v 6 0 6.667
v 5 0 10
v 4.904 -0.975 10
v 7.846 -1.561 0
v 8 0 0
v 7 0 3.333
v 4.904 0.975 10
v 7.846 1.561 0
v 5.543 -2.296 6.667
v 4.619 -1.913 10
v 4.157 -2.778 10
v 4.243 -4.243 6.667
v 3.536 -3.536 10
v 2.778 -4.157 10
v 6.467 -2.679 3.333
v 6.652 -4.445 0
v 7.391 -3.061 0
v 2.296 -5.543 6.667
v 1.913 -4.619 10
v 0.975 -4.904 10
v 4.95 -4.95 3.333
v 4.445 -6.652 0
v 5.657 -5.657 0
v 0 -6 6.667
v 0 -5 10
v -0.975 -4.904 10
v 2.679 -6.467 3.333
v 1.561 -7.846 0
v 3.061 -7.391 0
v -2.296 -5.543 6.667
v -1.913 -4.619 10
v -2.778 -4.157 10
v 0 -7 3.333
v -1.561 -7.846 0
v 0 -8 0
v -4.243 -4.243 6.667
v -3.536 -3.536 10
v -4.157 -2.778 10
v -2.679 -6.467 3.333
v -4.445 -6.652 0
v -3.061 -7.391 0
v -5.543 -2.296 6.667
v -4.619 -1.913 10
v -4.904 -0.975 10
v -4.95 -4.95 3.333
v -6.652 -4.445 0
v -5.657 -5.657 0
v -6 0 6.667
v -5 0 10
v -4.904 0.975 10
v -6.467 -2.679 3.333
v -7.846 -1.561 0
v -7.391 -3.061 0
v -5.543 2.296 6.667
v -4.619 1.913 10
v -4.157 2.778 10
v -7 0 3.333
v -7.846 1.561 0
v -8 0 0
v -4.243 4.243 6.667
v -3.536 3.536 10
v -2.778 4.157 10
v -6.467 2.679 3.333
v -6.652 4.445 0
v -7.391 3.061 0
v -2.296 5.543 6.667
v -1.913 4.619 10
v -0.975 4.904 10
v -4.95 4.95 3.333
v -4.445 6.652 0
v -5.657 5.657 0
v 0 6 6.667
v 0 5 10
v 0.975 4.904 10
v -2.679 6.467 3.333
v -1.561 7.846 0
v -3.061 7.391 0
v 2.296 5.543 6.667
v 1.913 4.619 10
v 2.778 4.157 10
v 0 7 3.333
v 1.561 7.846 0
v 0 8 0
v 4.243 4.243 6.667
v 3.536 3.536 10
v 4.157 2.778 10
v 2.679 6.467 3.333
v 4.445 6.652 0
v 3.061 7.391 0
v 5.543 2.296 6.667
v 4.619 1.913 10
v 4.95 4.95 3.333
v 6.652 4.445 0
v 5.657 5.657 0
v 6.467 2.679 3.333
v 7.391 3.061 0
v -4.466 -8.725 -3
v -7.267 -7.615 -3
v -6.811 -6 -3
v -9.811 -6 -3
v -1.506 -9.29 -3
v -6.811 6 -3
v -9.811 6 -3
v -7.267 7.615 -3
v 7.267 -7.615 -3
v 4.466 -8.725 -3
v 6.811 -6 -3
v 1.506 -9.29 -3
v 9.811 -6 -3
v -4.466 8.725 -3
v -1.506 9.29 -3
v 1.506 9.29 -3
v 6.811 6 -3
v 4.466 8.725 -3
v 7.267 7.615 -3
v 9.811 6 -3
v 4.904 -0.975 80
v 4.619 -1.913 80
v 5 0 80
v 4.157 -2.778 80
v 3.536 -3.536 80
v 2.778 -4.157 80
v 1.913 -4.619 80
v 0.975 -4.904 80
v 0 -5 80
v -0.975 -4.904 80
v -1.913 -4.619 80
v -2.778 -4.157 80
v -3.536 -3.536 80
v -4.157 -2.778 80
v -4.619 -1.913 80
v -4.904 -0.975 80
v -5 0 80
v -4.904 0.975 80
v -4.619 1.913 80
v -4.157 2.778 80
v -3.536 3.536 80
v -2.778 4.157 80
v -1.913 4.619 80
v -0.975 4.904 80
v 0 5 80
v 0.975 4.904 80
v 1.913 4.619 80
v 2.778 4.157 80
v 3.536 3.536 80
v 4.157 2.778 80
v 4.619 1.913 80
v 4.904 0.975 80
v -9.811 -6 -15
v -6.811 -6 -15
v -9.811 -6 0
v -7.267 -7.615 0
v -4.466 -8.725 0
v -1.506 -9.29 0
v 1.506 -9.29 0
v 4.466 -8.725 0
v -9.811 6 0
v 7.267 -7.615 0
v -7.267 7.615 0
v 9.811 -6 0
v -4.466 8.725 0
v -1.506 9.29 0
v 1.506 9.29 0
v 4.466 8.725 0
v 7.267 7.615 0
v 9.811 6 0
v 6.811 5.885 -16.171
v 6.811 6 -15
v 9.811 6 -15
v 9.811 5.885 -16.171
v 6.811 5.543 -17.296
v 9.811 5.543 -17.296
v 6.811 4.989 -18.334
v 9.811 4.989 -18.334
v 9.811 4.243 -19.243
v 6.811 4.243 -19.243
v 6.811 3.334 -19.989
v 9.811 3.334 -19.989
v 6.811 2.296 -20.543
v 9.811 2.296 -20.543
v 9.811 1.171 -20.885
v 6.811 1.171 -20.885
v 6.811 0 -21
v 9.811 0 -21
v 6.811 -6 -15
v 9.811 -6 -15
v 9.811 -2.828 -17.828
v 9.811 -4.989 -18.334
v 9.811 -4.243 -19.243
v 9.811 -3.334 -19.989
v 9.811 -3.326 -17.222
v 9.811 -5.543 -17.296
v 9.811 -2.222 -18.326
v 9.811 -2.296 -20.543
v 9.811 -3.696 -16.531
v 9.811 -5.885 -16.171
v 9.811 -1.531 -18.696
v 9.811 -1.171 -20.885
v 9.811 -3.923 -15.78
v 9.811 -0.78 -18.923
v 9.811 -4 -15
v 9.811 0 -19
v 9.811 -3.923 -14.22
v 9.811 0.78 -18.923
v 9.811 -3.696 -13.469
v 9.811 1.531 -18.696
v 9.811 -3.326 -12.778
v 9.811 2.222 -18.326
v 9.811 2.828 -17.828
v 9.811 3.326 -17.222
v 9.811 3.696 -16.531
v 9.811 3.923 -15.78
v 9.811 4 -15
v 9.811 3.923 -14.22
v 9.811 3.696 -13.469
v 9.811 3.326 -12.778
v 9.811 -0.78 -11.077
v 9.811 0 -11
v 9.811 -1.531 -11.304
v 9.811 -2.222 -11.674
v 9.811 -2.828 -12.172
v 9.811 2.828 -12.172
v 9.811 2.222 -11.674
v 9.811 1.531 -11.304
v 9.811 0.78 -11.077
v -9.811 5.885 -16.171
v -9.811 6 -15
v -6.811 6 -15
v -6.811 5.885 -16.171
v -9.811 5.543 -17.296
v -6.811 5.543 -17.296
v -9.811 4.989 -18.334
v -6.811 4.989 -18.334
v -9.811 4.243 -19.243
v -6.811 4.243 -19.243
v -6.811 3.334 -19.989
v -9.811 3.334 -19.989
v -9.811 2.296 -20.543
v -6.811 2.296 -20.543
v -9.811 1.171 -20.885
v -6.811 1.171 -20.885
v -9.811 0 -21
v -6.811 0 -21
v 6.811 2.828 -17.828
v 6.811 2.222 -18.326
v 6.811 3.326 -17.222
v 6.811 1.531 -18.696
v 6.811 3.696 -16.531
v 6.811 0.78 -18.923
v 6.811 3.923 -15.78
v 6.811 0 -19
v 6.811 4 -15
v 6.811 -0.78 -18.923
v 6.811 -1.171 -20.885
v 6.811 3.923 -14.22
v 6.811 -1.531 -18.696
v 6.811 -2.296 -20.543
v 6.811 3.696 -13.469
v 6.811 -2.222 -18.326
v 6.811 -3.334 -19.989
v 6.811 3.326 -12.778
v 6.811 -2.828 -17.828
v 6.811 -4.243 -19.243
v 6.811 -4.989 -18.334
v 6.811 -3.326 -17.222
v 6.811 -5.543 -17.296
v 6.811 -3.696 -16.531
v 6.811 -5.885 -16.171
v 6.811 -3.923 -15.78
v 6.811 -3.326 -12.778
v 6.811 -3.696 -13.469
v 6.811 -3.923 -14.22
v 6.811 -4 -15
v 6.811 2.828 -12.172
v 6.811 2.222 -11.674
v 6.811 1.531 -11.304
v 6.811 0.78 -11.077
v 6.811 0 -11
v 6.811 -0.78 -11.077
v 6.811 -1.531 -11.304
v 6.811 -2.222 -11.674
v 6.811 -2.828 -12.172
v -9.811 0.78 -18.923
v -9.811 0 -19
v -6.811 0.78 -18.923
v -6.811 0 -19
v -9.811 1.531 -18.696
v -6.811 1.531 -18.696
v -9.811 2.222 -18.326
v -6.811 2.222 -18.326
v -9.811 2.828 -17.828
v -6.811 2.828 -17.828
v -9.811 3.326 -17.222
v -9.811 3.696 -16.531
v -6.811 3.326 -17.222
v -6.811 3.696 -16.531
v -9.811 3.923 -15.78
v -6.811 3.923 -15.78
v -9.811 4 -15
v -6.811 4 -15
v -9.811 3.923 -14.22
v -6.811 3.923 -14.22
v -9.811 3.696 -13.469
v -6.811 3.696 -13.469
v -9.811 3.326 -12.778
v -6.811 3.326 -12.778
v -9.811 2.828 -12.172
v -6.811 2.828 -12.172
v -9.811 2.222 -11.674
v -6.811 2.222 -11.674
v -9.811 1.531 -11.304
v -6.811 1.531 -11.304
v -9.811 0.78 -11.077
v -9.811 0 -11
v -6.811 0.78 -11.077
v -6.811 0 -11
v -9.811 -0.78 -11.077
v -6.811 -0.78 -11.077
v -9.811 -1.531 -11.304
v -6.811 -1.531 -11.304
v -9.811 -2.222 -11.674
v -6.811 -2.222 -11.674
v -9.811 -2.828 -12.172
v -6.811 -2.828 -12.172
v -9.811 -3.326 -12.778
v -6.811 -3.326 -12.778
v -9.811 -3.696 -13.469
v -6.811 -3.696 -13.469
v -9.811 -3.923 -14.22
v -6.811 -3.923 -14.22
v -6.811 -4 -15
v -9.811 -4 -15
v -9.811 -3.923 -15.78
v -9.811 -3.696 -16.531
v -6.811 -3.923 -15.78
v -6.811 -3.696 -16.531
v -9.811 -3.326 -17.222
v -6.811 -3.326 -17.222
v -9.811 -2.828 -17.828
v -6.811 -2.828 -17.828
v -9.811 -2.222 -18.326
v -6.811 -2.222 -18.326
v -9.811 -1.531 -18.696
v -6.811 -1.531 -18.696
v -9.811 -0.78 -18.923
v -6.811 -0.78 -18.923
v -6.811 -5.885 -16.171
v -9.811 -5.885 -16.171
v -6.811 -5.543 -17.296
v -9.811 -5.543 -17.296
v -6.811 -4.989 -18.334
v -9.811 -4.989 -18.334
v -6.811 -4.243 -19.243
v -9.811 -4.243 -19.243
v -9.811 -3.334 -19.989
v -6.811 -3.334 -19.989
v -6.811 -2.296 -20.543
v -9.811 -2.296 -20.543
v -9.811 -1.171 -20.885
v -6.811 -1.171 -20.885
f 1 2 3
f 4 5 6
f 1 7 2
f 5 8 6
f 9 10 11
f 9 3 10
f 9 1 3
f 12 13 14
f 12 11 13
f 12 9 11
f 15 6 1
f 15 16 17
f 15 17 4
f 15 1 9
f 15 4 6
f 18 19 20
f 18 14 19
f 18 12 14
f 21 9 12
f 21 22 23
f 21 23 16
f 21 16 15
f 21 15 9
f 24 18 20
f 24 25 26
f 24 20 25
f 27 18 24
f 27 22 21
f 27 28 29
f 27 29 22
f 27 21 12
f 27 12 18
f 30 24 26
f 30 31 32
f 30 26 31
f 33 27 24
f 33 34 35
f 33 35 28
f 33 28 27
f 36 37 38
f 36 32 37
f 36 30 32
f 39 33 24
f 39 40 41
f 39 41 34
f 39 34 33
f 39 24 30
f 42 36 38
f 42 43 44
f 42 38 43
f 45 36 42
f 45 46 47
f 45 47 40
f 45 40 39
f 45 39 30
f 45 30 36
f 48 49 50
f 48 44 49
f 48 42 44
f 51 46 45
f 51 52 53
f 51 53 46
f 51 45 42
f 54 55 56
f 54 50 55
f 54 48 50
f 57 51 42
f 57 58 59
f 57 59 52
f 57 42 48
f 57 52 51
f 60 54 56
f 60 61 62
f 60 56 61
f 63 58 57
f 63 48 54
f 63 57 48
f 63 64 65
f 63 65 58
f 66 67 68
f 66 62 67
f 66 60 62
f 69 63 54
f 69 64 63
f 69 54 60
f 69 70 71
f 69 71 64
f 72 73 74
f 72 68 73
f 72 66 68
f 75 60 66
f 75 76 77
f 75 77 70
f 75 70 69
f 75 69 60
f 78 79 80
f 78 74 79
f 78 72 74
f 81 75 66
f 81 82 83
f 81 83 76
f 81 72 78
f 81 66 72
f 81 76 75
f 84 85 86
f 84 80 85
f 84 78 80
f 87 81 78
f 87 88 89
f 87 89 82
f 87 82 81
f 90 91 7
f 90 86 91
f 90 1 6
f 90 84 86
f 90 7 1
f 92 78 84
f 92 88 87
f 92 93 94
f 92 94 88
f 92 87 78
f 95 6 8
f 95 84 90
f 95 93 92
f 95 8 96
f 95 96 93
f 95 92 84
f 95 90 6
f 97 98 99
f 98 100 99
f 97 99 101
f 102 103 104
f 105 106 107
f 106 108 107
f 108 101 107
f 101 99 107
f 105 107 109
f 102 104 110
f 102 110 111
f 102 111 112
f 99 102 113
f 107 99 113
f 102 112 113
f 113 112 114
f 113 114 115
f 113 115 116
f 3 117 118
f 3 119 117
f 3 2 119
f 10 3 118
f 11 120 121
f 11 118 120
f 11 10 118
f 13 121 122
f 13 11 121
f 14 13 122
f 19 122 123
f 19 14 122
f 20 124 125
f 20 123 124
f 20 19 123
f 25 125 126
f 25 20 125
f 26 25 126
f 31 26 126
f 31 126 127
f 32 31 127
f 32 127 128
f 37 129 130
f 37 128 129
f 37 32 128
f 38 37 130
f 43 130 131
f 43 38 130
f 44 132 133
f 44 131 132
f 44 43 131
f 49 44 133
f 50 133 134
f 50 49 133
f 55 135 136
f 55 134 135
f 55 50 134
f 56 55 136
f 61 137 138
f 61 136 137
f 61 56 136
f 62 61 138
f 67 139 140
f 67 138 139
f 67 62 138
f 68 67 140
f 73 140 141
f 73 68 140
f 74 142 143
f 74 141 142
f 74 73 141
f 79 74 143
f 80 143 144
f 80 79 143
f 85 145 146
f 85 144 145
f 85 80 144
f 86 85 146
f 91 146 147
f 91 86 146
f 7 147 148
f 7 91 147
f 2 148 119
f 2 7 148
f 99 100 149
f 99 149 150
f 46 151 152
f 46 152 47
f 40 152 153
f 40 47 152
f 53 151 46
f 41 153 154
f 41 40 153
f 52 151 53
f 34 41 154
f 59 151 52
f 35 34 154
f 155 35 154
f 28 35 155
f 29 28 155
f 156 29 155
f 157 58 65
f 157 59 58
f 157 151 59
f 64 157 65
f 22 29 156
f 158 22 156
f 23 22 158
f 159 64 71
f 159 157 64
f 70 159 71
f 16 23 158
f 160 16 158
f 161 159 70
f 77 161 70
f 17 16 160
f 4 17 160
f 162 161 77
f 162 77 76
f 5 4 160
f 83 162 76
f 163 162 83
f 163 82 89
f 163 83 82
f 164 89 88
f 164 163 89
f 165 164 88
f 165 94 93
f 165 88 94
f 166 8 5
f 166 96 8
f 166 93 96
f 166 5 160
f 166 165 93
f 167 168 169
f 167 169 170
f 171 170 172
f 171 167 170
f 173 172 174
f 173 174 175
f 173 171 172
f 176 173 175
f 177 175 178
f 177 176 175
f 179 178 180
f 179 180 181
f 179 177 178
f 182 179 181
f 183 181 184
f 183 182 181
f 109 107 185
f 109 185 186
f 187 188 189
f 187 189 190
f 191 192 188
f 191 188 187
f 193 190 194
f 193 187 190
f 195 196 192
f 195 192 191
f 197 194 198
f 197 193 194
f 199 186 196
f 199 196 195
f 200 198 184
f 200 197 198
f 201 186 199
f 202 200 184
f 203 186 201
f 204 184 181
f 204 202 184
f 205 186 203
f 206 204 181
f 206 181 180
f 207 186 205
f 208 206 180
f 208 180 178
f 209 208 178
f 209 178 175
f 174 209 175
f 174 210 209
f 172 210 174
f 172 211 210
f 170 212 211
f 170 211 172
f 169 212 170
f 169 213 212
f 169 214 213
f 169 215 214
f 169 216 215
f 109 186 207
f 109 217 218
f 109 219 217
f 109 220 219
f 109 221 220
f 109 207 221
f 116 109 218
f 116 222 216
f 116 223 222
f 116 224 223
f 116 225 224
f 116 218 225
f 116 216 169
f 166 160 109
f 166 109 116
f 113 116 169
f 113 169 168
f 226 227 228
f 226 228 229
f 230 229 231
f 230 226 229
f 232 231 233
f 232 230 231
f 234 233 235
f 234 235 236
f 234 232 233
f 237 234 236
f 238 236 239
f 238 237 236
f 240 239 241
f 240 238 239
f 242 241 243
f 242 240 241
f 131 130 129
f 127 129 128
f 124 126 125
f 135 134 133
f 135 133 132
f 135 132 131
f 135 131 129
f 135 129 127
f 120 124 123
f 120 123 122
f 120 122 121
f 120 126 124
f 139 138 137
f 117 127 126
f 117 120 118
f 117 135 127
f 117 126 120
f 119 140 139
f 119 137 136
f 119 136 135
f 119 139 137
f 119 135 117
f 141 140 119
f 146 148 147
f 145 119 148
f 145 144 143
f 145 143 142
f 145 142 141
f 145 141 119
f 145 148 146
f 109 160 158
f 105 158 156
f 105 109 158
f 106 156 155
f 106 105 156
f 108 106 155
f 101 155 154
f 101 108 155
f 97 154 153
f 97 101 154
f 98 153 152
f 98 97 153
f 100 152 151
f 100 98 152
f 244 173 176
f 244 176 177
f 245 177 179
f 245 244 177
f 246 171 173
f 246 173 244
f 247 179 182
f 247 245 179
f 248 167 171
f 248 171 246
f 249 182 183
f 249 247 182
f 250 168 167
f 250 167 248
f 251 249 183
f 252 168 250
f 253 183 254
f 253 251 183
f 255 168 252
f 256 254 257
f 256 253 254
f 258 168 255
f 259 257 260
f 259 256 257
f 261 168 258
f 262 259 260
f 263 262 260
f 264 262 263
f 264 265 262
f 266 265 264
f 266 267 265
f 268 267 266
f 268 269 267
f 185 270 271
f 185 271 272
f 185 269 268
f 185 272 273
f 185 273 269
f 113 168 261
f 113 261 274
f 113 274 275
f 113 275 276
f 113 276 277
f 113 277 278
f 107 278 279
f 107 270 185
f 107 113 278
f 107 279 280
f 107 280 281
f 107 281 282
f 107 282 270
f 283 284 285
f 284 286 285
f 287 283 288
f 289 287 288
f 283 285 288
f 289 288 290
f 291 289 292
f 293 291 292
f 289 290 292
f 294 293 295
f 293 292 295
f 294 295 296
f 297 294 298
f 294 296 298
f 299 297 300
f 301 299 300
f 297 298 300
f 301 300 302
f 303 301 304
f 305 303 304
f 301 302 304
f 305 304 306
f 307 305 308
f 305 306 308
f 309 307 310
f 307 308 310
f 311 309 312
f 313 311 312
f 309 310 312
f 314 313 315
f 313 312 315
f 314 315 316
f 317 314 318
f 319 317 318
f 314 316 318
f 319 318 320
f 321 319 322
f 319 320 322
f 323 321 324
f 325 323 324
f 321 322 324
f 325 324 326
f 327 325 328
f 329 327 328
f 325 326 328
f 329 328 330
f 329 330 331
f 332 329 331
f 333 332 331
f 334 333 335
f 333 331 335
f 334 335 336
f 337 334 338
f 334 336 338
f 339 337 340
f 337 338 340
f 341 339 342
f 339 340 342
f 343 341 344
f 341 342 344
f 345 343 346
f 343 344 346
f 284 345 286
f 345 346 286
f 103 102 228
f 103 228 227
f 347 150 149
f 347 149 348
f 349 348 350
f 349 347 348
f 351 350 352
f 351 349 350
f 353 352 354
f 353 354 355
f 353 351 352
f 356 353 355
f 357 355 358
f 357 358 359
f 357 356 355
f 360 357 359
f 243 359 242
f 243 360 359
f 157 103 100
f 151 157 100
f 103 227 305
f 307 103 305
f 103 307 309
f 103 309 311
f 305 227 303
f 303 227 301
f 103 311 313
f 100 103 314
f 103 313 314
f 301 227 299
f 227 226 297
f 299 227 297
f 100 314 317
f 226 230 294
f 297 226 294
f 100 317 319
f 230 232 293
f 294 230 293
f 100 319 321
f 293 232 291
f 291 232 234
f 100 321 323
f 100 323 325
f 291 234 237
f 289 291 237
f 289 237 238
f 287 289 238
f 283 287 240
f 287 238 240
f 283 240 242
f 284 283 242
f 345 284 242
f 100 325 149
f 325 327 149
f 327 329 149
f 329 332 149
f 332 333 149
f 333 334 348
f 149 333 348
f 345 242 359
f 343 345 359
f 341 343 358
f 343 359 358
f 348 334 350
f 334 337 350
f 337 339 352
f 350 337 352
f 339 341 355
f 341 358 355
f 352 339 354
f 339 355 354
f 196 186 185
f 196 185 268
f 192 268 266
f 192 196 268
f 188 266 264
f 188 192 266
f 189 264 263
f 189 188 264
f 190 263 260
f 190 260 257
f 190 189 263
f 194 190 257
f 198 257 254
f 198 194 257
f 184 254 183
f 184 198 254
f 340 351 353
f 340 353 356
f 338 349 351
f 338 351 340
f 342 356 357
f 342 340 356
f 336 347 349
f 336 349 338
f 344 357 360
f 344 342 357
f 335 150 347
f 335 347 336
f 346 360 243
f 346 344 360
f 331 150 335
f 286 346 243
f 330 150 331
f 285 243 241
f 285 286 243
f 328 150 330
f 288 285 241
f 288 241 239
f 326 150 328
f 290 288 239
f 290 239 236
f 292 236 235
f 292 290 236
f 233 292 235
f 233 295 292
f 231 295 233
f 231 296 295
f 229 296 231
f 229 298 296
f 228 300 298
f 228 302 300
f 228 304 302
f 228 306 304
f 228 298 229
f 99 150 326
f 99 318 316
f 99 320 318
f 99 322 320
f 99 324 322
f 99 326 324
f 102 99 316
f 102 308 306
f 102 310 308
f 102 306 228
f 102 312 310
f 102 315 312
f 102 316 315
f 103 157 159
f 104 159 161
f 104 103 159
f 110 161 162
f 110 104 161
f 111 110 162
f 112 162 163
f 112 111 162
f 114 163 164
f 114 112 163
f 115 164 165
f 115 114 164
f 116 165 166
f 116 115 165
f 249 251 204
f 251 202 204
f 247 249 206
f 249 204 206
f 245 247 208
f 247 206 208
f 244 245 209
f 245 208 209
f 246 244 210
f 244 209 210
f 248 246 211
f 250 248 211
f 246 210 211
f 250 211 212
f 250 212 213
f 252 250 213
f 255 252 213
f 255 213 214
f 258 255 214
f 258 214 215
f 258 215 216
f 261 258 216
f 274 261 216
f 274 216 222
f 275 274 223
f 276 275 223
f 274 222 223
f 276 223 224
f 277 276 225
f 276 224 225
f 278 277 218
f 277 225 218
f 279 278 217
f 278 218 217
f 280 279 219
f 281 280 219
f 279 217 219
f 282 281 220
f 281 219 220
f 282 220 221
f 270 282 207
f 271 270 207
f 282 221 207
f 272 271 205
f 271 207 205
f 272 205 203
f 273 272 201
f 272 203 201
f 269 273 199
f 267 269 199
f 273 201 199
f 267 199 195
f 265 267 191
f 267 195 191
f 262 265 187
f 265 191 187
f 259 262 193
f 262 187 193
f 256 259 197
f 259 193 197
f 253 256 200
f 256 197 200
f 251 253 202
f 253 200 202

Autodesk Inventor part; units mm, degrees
ref_plane "YZ Plane" through (0, 0, 0) normal (1, 0, 0) x (0, 1, 0)
ref_plane "XZ Plane" through (0, 0, 0) normal (0, 1, 0) x (-1, 0, 0)
sketch "Sketch1" plane through (0, 0, 0) normal (0, 0, 1) x (1, 0, 0)
  circle A0 centre (0, 0) radius 11.5
extrude "Extrusion1" add sketch "Sketch1" against normal blind 3
sketch "Sketch2" plane through (0, 0, -3) normal (0, 0, -1) x (-1, 0, 0)
  line L0 (-9.8107, 6) -> (-6.8107, 6)
  line L1 (-6.8107, 6) -> (-6.8107, -6)
  line L2 (-6.8107, -6) -> (-9.8107, -6)
  line L3 (-9.8107, -6) -> (-9.8107, 6)
  line L4 (6.8107, 6) -> (9.8107, 6)
  line L5 (9.8107, 6) -> (9.8107, -6)
  line L6 (9.8107, -6) -> (6.8107, -6)
  line L7 (6.8107, -6) -> (6.8107, 6)
  circle A0 centre (0, 0) radius 11.5 construction
  line L8 (0, 11.5) -> (0, -11.5) construction
  arc A1 (-9.8107, 6) -> (-9.8107, -6) centre (0, 0) ccw
  arc A2 (9.8107, -6) -> (9.8107, 6) centre (0, 0) ccw
  arc A3 (9.8107, 6) -> (-9.8107, 6) centre (0, -6.6392) ccw
  arc A4 (-9.8107, -6) -> (9.8107, -6) centre (0, 6.6392) ccw
  circle A5 centre (0, 0) radius 11.5
  point P0 (6.8107, 0)
  dimension "d18" = 3
  dimension "d19" = 12
  dimension "d29" = 16
extrude "Extrusion4" add sketch "Sketch2" along normal blind 18 contours L0 L1 L2 L3 | L5 L6 L7 L4
fillet "Fillet3" radius 6 4 edges at (8.3107, 6, -21) (8.3107, -6, -21) (-8.3107, 6, -21) (-8.3107, -6, -21)
sketch "Sketch3" plane through (9.8107, -6, -3) normal (1, 0, 0) x (0, 0, -1)
  arc A0 (12, 0) -> (12, 12) centre (12, 6) ccw construction
  circle A1 centre (12, 6) radius 4
  point P0 (-3, 6)
  dimension "d23" = 8
extrude "Extrusion5" cut sketch "Sketch3" against normal through all
extrude "Extrusion6" cut sketch "Sketch2" against normal blind 10 contours L3 A1 | A5 A3 | A4 A5 | A2 L5
sketch "Sketch5" plane through (0, 0, 0) normal (0, 0, 1) x (1, 0, 0)
  circle A0 centre (0, 0) radius 8
  dimension "d35" = 16
ref_plane "Work Plane1" through (0, 0, 10) normal (0, 0, 1) x (1, 0, 0)
sketch "Sketch6" plane through (0, 0, 10) normal (0, 0, 1) x (1, 0, 0)
  circle A0 centre (0, 0) radius 8 construction
  circle A1 centre (0, 0) radius 5
  dimension "d37" = 10
loft "Loft1" add profiles "Sketch5", "Sketch6"
sketch "Sketch7" plane through (0, 0, 10) normal (0, 0, 1) x (1, 0, 0)
  circle A0 centre (0, 0) radius 5
  circle A1 centre (0, 0) radius 5 construction
extrude "Extrusion8" add sketch "Sketch7" along normal blind 70
properties part number "wheel hub"
